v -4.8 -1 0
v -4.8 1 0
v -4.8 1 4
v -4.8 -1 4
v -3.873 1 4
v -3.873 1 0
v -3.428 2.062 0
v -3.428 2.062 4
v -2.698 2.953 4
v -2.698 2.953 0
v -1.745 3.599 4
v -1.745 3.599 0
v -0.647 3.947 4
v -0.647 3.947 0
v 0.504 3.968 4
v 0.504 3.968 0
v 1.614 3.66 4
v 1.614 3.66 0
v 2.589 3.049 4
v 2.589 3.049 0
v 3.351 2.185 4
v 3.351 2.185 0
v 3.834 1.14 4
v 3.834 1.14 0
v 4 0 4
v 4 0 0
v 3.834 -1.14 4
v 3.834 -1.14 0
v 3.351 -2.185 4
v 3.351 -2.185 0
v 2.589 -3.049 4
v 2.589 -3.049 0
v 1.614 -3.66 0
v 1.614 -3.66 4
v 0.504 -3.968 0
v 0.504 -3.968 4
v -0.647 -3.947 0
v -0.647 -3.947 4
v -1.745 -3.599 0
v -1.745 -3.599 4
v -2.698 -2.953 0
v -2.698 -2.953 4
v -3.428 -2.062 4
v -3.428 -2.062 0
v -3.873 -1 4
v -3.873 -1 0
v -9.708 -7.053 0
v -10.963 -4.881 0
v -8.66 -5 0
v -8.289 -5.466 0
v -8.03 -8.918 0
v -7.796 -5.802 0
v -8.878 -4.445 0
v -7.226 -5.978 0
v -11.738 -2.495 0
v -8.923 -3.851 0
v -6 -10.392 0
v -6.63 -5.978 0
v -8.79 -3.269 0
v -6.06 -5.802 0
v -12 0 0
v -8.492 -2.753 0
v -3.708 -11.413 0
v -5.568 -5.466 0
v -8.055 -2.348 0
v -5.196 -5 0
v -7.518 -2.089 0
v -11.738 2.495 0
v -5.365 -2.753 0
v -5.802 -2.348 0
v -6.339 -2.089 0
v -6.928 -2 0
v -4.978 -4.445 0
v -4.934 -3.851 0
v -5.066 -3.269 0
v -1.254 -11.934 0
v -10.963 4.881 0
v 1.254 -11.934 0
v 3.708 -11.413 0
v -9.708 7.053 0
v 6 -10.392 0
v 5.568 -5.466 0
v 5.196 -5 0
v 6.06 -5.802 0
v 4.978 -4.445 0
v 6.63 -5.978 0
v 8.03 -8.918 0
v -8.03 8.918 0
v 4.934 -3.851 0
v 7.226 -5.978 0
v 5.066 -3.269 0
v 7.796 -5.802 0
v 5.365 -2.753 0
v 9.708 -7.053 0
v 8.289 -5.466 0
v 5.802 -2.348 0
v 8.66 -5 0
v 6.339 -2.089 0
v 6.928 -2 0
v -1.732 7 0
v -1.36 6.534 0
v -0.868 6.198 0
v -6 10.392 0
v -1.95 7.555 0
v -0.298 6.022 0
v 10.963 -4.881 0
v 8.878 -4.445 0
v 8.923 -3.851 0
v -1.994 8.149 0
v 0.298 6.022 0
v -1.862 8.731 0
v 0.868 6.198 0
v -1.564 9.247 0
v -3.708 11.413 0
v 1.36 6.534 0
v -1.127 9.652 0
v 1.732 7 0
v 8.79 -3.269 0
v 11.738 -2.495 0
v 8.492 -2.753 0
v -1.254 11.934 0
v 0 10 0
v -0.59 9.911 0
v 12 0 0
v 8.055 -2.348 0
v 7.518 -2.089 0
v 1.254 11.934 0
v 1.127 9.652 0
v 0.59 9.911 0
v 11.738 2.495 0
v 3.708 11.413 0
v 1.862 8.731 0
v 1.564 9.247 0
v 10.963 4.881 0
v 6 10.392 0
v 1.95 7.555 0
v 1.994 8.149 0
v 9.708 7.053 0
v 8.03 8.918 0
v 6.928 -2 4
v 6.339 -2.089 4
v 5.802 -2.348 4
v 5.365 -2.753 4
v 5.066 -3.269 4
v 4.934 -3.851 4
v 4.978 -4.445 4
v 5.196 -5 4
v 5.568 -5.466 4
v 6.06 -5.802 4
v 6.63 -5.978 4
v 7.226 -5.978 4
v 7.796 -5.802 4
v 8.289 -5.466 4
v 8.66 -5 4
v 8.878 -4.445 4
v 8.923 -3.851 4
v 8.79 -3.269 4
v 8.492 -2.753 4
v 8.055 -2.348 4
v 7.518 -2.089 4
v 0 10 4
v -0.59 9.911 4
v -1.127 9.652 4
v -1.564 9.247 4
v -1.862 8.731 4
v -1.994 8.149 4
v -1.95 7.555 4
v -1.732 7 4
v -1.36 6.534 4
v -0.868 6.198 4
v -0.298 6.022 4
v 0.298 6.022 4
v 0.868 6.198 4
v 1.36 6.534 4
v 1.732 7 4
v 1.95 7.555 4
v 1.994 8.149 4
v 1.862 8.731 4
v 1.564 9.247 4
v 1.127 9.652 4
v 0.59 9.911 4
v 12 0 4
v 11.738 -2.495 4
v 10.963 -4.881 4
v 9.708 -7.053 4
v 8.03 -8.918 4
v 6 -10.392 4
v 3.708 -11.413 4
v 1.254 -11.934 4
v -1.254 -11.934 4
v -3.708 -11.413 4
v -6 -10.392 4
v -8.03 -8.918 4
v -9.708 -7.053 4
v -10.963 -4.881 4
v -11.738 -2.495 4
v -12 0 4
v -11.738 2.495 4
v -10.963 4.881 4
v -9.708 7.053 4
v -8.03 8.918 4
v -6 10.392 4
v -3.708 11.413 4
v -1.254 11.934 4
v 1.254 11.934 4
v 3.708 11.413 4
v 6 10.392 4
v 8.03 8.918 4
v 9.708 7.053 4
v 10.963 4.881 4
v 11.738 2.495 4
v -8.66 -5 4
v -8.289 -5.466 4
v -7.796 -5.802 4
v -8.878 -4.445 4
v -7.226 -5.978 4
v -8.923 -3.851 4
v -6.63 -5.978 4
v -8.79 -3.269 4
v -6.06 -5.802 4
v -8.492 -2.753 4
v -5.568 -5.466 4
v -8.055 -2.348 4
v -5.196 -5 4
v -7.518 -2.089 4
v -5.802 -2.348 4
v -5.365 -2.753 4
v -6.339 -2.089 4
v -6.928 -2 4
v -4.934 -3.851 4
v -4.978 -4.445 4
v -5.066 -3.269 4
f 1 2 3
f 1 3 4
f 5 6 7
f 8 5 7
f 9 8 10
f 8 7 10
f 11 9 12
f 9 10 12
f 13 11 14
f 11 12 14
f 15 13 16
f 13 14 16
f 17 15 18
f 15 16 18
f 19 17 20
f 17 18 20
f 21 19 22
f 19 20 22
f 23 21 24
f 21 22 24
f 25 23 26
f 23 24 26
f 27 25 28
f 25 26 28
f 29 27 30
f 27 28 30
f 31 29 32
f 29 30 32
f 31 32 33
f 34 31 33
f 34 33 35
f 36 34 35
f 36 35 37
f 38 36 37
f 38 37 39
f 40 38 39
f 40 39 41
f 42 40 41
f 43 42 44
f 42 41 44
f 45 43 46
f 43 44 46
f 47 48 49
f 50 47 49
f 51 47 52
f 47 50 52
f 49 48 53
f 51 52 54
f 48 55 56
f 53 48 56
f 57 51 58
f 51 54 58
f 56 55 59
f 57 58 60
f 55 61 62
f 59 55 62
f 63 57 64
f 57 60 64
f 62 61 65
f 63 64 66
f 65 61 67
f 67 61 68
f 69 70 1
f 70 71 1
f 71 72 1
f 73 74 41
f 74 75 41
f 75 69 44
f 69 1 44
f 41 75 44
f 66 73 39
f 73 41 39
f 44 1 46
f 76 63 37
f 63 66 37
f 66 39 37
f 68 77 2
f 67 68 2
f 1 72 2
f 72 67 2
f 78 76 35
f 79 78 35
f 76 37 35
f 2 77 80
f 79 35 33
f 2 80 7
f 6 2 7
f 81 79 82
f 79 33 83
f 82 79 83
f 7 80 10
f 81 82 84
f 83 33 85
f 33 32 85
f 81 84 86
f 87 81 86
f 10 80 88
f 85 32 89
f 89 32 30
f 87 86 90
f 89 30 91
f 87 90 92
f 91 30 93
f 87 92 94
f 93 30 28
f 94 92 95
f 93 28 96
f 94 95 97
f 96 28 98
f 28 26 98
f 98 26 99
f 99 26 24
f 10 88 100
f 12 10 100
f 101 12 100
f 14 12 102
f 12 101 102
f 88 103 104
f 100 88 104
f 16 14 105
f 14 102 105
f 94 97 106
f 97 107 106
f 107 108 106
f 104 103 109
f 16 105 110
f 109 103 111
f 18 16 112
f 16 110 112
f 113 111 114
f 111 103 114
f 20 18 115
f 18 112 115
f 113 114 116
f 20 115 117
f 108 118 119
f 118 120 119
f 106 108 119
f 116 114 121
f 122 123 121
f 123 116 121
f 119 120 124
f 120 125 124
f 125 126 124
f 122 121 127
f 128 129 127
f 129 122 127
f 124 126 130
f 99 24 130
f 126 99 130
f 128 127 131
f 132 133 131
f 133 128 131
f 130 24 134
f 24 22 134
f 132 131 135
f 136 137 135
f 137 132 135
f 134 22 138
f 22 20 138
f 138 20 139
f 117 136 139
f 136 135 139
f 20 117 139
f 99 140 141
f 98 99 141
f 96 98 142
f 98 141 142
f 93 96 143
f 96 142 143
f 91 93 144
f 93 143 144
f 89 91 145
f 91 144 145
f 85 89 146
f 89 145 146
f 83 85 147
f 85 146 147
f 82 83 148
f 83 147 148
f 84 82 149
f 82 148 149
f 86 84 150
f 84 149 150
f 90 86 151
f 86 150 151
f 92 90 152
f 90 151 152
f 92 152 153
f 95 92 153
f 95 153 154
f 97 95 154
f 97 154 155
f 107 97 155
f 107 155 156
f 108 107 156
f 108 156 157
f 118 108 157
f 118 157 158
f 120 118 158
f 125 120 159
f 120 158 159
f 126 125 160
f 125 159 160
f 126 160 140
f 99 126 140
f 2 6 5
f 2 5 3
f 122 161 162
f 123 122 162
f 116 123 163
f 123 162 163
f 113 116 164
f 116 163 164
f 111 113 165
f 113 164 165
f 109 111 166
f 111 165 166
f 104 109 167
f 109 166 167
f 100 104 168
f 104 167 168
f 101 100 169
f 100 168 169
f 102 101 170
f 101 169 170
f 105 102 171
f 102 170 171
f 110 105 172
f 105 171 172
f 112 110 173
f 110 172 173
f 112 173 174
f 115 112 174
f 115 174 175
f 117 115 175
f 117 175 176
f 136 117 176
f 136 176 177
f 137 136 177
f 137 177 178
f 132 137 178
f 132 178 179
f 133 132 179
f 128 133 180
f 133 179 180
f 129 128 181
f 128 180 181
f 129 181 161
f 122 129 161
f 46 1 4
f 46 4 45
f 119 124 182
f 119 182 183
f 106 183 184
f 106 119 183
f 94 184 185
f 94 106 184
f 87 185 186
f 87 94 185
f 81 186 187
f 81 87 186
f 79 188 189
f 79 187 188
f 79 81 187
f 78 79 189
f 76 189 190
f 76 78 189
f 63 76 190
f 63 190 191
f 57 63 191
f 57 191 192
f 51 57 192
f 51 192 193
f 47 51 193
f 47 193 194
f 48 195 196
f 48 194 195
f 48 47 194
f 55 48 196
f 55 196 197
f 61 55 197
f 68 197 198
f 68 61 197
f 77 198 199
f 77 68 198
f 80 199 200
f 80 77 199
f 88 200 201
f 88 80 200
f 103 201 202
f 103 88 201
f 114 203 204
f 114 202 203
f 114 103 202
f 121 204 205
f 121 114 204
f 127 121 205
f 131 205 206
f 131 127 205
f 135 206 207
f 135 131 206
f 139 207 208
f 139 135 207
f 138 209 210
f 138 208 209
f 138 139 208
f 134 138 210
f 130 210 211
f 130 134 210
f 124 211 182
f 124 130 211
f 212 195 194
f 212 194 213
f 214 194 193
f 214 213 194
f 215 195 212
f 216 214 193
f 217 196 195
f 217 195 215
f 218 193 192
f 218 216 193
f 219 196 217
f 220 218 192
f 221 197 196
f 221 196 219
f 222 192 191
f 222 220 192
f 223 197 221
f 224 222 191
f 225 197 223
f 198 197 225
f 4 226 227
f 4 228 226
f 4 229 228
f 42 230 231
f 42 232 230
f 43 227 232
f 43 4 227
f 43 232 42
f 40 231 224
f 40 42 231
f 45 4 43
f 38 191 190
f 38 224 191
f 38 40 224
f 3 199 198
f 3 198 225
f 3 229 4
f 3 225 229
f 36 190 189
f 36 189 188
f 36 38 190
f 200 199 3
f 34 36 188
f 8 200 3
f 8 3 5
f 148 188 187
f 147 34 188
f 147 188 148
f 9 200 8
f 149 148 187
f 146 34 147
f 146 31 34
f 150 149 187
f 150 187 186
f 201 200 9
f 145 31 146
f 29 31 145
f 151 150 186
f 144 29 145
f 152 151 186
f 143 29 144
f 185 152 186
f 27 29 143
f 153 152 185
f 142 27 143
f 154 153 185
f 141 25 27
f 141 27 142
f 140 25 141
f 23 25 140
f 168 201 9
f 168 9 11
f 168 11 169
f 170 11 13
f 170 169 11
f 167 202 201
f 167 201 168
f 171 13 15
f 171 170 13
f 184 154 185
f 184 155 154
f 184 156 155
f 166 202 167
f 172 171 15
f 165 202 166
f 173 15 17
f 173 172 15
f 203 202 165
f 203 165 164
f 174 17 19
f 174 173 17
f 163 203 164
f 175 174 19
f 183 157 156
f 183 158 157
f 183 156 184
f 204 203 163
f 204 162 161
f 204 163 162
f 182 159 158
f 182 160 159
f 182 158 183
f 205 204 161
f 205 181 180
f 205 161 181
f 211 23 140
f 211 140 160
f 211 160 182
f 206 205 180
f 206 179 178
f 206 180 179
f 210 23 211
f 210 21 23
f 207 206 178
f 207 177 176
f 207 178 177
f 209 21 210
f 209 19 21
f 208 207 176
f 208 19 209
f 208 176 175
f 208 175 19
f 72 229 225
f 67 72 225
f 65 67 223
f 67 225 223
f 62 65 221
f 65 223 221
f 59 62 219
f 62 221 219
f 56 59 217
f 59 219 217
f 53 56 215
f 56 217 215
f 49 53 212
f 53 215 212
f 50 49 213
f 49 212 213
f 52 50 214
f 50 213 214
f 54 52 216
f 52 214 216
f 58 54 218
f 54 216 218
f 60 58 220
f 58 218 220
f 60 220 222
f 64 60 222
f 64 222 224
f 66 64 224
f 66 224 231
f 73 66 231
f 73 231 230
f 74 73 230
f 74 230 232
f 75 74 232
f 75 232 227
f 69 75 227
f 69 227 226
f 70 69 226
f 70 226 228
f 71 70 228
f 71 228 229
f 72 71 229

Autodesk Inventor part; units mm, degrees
ref_plane "YZ Plane" through (0, 0, 0) normal (1, 0, 0) x (0, 1, 0)
ref_plane "XZ Plane" through (0, 0, 0) normal (0, 1, 0) x (-1, 0, 0)
ref_plane "Work Plane1" through (0, 0, 0) normal (0, 0, 1) x (1, 0, 0)
sketch "Sketch1" plane through (0, 0, 0) normal (0, 0, 1) x (1, 0, 0)
  circle A0 centre (0, 0) radius 12 projected
  circle A1 centre (-6.9282, -4) radius 2 projected
  circle A2 centre (6.9282, -4) radius 2 projected
  circle A3 centre (0, 8) radius 2 projected
  line L0 (-4.8, 1) -> (-4.8, -1) projected
  line L1 (-3.873, 1) -> (-4.8, 1) projected
  arc A4 (-3.873, -1) -> (-3.873, 1) centre (0, 0) ccw projected
  line L2 (-4.8, -1) -> (-3.873, -1) projected
  point P0 (0, 0)
extrude "Extrusion1" add sketch "Sketch1" along normal blind 4 contours A0 | A1 | A2 | A3
sketch "Sketch2" plane through (0, 0, 0) normal (0, 0, -1) x (-1, 0, 0)
  point P0 (0, 0)
  point P1 (-6.9282, -4)
  point P2 (0, 8)
  point P3 (6.9282, -4)
hole "Hole1" at (6.9282, -4, 0) at (0, 8, 0) at (-6.9282, -4, 0) direction (0, 0, 1) diameter 4 end through all clearance for "Countersunk Flat Head Screw ISO 2009/7046" size "M4" standard "ISO"
properties part number "spiebaanplaatKlein" material "Aluminum 6061"
